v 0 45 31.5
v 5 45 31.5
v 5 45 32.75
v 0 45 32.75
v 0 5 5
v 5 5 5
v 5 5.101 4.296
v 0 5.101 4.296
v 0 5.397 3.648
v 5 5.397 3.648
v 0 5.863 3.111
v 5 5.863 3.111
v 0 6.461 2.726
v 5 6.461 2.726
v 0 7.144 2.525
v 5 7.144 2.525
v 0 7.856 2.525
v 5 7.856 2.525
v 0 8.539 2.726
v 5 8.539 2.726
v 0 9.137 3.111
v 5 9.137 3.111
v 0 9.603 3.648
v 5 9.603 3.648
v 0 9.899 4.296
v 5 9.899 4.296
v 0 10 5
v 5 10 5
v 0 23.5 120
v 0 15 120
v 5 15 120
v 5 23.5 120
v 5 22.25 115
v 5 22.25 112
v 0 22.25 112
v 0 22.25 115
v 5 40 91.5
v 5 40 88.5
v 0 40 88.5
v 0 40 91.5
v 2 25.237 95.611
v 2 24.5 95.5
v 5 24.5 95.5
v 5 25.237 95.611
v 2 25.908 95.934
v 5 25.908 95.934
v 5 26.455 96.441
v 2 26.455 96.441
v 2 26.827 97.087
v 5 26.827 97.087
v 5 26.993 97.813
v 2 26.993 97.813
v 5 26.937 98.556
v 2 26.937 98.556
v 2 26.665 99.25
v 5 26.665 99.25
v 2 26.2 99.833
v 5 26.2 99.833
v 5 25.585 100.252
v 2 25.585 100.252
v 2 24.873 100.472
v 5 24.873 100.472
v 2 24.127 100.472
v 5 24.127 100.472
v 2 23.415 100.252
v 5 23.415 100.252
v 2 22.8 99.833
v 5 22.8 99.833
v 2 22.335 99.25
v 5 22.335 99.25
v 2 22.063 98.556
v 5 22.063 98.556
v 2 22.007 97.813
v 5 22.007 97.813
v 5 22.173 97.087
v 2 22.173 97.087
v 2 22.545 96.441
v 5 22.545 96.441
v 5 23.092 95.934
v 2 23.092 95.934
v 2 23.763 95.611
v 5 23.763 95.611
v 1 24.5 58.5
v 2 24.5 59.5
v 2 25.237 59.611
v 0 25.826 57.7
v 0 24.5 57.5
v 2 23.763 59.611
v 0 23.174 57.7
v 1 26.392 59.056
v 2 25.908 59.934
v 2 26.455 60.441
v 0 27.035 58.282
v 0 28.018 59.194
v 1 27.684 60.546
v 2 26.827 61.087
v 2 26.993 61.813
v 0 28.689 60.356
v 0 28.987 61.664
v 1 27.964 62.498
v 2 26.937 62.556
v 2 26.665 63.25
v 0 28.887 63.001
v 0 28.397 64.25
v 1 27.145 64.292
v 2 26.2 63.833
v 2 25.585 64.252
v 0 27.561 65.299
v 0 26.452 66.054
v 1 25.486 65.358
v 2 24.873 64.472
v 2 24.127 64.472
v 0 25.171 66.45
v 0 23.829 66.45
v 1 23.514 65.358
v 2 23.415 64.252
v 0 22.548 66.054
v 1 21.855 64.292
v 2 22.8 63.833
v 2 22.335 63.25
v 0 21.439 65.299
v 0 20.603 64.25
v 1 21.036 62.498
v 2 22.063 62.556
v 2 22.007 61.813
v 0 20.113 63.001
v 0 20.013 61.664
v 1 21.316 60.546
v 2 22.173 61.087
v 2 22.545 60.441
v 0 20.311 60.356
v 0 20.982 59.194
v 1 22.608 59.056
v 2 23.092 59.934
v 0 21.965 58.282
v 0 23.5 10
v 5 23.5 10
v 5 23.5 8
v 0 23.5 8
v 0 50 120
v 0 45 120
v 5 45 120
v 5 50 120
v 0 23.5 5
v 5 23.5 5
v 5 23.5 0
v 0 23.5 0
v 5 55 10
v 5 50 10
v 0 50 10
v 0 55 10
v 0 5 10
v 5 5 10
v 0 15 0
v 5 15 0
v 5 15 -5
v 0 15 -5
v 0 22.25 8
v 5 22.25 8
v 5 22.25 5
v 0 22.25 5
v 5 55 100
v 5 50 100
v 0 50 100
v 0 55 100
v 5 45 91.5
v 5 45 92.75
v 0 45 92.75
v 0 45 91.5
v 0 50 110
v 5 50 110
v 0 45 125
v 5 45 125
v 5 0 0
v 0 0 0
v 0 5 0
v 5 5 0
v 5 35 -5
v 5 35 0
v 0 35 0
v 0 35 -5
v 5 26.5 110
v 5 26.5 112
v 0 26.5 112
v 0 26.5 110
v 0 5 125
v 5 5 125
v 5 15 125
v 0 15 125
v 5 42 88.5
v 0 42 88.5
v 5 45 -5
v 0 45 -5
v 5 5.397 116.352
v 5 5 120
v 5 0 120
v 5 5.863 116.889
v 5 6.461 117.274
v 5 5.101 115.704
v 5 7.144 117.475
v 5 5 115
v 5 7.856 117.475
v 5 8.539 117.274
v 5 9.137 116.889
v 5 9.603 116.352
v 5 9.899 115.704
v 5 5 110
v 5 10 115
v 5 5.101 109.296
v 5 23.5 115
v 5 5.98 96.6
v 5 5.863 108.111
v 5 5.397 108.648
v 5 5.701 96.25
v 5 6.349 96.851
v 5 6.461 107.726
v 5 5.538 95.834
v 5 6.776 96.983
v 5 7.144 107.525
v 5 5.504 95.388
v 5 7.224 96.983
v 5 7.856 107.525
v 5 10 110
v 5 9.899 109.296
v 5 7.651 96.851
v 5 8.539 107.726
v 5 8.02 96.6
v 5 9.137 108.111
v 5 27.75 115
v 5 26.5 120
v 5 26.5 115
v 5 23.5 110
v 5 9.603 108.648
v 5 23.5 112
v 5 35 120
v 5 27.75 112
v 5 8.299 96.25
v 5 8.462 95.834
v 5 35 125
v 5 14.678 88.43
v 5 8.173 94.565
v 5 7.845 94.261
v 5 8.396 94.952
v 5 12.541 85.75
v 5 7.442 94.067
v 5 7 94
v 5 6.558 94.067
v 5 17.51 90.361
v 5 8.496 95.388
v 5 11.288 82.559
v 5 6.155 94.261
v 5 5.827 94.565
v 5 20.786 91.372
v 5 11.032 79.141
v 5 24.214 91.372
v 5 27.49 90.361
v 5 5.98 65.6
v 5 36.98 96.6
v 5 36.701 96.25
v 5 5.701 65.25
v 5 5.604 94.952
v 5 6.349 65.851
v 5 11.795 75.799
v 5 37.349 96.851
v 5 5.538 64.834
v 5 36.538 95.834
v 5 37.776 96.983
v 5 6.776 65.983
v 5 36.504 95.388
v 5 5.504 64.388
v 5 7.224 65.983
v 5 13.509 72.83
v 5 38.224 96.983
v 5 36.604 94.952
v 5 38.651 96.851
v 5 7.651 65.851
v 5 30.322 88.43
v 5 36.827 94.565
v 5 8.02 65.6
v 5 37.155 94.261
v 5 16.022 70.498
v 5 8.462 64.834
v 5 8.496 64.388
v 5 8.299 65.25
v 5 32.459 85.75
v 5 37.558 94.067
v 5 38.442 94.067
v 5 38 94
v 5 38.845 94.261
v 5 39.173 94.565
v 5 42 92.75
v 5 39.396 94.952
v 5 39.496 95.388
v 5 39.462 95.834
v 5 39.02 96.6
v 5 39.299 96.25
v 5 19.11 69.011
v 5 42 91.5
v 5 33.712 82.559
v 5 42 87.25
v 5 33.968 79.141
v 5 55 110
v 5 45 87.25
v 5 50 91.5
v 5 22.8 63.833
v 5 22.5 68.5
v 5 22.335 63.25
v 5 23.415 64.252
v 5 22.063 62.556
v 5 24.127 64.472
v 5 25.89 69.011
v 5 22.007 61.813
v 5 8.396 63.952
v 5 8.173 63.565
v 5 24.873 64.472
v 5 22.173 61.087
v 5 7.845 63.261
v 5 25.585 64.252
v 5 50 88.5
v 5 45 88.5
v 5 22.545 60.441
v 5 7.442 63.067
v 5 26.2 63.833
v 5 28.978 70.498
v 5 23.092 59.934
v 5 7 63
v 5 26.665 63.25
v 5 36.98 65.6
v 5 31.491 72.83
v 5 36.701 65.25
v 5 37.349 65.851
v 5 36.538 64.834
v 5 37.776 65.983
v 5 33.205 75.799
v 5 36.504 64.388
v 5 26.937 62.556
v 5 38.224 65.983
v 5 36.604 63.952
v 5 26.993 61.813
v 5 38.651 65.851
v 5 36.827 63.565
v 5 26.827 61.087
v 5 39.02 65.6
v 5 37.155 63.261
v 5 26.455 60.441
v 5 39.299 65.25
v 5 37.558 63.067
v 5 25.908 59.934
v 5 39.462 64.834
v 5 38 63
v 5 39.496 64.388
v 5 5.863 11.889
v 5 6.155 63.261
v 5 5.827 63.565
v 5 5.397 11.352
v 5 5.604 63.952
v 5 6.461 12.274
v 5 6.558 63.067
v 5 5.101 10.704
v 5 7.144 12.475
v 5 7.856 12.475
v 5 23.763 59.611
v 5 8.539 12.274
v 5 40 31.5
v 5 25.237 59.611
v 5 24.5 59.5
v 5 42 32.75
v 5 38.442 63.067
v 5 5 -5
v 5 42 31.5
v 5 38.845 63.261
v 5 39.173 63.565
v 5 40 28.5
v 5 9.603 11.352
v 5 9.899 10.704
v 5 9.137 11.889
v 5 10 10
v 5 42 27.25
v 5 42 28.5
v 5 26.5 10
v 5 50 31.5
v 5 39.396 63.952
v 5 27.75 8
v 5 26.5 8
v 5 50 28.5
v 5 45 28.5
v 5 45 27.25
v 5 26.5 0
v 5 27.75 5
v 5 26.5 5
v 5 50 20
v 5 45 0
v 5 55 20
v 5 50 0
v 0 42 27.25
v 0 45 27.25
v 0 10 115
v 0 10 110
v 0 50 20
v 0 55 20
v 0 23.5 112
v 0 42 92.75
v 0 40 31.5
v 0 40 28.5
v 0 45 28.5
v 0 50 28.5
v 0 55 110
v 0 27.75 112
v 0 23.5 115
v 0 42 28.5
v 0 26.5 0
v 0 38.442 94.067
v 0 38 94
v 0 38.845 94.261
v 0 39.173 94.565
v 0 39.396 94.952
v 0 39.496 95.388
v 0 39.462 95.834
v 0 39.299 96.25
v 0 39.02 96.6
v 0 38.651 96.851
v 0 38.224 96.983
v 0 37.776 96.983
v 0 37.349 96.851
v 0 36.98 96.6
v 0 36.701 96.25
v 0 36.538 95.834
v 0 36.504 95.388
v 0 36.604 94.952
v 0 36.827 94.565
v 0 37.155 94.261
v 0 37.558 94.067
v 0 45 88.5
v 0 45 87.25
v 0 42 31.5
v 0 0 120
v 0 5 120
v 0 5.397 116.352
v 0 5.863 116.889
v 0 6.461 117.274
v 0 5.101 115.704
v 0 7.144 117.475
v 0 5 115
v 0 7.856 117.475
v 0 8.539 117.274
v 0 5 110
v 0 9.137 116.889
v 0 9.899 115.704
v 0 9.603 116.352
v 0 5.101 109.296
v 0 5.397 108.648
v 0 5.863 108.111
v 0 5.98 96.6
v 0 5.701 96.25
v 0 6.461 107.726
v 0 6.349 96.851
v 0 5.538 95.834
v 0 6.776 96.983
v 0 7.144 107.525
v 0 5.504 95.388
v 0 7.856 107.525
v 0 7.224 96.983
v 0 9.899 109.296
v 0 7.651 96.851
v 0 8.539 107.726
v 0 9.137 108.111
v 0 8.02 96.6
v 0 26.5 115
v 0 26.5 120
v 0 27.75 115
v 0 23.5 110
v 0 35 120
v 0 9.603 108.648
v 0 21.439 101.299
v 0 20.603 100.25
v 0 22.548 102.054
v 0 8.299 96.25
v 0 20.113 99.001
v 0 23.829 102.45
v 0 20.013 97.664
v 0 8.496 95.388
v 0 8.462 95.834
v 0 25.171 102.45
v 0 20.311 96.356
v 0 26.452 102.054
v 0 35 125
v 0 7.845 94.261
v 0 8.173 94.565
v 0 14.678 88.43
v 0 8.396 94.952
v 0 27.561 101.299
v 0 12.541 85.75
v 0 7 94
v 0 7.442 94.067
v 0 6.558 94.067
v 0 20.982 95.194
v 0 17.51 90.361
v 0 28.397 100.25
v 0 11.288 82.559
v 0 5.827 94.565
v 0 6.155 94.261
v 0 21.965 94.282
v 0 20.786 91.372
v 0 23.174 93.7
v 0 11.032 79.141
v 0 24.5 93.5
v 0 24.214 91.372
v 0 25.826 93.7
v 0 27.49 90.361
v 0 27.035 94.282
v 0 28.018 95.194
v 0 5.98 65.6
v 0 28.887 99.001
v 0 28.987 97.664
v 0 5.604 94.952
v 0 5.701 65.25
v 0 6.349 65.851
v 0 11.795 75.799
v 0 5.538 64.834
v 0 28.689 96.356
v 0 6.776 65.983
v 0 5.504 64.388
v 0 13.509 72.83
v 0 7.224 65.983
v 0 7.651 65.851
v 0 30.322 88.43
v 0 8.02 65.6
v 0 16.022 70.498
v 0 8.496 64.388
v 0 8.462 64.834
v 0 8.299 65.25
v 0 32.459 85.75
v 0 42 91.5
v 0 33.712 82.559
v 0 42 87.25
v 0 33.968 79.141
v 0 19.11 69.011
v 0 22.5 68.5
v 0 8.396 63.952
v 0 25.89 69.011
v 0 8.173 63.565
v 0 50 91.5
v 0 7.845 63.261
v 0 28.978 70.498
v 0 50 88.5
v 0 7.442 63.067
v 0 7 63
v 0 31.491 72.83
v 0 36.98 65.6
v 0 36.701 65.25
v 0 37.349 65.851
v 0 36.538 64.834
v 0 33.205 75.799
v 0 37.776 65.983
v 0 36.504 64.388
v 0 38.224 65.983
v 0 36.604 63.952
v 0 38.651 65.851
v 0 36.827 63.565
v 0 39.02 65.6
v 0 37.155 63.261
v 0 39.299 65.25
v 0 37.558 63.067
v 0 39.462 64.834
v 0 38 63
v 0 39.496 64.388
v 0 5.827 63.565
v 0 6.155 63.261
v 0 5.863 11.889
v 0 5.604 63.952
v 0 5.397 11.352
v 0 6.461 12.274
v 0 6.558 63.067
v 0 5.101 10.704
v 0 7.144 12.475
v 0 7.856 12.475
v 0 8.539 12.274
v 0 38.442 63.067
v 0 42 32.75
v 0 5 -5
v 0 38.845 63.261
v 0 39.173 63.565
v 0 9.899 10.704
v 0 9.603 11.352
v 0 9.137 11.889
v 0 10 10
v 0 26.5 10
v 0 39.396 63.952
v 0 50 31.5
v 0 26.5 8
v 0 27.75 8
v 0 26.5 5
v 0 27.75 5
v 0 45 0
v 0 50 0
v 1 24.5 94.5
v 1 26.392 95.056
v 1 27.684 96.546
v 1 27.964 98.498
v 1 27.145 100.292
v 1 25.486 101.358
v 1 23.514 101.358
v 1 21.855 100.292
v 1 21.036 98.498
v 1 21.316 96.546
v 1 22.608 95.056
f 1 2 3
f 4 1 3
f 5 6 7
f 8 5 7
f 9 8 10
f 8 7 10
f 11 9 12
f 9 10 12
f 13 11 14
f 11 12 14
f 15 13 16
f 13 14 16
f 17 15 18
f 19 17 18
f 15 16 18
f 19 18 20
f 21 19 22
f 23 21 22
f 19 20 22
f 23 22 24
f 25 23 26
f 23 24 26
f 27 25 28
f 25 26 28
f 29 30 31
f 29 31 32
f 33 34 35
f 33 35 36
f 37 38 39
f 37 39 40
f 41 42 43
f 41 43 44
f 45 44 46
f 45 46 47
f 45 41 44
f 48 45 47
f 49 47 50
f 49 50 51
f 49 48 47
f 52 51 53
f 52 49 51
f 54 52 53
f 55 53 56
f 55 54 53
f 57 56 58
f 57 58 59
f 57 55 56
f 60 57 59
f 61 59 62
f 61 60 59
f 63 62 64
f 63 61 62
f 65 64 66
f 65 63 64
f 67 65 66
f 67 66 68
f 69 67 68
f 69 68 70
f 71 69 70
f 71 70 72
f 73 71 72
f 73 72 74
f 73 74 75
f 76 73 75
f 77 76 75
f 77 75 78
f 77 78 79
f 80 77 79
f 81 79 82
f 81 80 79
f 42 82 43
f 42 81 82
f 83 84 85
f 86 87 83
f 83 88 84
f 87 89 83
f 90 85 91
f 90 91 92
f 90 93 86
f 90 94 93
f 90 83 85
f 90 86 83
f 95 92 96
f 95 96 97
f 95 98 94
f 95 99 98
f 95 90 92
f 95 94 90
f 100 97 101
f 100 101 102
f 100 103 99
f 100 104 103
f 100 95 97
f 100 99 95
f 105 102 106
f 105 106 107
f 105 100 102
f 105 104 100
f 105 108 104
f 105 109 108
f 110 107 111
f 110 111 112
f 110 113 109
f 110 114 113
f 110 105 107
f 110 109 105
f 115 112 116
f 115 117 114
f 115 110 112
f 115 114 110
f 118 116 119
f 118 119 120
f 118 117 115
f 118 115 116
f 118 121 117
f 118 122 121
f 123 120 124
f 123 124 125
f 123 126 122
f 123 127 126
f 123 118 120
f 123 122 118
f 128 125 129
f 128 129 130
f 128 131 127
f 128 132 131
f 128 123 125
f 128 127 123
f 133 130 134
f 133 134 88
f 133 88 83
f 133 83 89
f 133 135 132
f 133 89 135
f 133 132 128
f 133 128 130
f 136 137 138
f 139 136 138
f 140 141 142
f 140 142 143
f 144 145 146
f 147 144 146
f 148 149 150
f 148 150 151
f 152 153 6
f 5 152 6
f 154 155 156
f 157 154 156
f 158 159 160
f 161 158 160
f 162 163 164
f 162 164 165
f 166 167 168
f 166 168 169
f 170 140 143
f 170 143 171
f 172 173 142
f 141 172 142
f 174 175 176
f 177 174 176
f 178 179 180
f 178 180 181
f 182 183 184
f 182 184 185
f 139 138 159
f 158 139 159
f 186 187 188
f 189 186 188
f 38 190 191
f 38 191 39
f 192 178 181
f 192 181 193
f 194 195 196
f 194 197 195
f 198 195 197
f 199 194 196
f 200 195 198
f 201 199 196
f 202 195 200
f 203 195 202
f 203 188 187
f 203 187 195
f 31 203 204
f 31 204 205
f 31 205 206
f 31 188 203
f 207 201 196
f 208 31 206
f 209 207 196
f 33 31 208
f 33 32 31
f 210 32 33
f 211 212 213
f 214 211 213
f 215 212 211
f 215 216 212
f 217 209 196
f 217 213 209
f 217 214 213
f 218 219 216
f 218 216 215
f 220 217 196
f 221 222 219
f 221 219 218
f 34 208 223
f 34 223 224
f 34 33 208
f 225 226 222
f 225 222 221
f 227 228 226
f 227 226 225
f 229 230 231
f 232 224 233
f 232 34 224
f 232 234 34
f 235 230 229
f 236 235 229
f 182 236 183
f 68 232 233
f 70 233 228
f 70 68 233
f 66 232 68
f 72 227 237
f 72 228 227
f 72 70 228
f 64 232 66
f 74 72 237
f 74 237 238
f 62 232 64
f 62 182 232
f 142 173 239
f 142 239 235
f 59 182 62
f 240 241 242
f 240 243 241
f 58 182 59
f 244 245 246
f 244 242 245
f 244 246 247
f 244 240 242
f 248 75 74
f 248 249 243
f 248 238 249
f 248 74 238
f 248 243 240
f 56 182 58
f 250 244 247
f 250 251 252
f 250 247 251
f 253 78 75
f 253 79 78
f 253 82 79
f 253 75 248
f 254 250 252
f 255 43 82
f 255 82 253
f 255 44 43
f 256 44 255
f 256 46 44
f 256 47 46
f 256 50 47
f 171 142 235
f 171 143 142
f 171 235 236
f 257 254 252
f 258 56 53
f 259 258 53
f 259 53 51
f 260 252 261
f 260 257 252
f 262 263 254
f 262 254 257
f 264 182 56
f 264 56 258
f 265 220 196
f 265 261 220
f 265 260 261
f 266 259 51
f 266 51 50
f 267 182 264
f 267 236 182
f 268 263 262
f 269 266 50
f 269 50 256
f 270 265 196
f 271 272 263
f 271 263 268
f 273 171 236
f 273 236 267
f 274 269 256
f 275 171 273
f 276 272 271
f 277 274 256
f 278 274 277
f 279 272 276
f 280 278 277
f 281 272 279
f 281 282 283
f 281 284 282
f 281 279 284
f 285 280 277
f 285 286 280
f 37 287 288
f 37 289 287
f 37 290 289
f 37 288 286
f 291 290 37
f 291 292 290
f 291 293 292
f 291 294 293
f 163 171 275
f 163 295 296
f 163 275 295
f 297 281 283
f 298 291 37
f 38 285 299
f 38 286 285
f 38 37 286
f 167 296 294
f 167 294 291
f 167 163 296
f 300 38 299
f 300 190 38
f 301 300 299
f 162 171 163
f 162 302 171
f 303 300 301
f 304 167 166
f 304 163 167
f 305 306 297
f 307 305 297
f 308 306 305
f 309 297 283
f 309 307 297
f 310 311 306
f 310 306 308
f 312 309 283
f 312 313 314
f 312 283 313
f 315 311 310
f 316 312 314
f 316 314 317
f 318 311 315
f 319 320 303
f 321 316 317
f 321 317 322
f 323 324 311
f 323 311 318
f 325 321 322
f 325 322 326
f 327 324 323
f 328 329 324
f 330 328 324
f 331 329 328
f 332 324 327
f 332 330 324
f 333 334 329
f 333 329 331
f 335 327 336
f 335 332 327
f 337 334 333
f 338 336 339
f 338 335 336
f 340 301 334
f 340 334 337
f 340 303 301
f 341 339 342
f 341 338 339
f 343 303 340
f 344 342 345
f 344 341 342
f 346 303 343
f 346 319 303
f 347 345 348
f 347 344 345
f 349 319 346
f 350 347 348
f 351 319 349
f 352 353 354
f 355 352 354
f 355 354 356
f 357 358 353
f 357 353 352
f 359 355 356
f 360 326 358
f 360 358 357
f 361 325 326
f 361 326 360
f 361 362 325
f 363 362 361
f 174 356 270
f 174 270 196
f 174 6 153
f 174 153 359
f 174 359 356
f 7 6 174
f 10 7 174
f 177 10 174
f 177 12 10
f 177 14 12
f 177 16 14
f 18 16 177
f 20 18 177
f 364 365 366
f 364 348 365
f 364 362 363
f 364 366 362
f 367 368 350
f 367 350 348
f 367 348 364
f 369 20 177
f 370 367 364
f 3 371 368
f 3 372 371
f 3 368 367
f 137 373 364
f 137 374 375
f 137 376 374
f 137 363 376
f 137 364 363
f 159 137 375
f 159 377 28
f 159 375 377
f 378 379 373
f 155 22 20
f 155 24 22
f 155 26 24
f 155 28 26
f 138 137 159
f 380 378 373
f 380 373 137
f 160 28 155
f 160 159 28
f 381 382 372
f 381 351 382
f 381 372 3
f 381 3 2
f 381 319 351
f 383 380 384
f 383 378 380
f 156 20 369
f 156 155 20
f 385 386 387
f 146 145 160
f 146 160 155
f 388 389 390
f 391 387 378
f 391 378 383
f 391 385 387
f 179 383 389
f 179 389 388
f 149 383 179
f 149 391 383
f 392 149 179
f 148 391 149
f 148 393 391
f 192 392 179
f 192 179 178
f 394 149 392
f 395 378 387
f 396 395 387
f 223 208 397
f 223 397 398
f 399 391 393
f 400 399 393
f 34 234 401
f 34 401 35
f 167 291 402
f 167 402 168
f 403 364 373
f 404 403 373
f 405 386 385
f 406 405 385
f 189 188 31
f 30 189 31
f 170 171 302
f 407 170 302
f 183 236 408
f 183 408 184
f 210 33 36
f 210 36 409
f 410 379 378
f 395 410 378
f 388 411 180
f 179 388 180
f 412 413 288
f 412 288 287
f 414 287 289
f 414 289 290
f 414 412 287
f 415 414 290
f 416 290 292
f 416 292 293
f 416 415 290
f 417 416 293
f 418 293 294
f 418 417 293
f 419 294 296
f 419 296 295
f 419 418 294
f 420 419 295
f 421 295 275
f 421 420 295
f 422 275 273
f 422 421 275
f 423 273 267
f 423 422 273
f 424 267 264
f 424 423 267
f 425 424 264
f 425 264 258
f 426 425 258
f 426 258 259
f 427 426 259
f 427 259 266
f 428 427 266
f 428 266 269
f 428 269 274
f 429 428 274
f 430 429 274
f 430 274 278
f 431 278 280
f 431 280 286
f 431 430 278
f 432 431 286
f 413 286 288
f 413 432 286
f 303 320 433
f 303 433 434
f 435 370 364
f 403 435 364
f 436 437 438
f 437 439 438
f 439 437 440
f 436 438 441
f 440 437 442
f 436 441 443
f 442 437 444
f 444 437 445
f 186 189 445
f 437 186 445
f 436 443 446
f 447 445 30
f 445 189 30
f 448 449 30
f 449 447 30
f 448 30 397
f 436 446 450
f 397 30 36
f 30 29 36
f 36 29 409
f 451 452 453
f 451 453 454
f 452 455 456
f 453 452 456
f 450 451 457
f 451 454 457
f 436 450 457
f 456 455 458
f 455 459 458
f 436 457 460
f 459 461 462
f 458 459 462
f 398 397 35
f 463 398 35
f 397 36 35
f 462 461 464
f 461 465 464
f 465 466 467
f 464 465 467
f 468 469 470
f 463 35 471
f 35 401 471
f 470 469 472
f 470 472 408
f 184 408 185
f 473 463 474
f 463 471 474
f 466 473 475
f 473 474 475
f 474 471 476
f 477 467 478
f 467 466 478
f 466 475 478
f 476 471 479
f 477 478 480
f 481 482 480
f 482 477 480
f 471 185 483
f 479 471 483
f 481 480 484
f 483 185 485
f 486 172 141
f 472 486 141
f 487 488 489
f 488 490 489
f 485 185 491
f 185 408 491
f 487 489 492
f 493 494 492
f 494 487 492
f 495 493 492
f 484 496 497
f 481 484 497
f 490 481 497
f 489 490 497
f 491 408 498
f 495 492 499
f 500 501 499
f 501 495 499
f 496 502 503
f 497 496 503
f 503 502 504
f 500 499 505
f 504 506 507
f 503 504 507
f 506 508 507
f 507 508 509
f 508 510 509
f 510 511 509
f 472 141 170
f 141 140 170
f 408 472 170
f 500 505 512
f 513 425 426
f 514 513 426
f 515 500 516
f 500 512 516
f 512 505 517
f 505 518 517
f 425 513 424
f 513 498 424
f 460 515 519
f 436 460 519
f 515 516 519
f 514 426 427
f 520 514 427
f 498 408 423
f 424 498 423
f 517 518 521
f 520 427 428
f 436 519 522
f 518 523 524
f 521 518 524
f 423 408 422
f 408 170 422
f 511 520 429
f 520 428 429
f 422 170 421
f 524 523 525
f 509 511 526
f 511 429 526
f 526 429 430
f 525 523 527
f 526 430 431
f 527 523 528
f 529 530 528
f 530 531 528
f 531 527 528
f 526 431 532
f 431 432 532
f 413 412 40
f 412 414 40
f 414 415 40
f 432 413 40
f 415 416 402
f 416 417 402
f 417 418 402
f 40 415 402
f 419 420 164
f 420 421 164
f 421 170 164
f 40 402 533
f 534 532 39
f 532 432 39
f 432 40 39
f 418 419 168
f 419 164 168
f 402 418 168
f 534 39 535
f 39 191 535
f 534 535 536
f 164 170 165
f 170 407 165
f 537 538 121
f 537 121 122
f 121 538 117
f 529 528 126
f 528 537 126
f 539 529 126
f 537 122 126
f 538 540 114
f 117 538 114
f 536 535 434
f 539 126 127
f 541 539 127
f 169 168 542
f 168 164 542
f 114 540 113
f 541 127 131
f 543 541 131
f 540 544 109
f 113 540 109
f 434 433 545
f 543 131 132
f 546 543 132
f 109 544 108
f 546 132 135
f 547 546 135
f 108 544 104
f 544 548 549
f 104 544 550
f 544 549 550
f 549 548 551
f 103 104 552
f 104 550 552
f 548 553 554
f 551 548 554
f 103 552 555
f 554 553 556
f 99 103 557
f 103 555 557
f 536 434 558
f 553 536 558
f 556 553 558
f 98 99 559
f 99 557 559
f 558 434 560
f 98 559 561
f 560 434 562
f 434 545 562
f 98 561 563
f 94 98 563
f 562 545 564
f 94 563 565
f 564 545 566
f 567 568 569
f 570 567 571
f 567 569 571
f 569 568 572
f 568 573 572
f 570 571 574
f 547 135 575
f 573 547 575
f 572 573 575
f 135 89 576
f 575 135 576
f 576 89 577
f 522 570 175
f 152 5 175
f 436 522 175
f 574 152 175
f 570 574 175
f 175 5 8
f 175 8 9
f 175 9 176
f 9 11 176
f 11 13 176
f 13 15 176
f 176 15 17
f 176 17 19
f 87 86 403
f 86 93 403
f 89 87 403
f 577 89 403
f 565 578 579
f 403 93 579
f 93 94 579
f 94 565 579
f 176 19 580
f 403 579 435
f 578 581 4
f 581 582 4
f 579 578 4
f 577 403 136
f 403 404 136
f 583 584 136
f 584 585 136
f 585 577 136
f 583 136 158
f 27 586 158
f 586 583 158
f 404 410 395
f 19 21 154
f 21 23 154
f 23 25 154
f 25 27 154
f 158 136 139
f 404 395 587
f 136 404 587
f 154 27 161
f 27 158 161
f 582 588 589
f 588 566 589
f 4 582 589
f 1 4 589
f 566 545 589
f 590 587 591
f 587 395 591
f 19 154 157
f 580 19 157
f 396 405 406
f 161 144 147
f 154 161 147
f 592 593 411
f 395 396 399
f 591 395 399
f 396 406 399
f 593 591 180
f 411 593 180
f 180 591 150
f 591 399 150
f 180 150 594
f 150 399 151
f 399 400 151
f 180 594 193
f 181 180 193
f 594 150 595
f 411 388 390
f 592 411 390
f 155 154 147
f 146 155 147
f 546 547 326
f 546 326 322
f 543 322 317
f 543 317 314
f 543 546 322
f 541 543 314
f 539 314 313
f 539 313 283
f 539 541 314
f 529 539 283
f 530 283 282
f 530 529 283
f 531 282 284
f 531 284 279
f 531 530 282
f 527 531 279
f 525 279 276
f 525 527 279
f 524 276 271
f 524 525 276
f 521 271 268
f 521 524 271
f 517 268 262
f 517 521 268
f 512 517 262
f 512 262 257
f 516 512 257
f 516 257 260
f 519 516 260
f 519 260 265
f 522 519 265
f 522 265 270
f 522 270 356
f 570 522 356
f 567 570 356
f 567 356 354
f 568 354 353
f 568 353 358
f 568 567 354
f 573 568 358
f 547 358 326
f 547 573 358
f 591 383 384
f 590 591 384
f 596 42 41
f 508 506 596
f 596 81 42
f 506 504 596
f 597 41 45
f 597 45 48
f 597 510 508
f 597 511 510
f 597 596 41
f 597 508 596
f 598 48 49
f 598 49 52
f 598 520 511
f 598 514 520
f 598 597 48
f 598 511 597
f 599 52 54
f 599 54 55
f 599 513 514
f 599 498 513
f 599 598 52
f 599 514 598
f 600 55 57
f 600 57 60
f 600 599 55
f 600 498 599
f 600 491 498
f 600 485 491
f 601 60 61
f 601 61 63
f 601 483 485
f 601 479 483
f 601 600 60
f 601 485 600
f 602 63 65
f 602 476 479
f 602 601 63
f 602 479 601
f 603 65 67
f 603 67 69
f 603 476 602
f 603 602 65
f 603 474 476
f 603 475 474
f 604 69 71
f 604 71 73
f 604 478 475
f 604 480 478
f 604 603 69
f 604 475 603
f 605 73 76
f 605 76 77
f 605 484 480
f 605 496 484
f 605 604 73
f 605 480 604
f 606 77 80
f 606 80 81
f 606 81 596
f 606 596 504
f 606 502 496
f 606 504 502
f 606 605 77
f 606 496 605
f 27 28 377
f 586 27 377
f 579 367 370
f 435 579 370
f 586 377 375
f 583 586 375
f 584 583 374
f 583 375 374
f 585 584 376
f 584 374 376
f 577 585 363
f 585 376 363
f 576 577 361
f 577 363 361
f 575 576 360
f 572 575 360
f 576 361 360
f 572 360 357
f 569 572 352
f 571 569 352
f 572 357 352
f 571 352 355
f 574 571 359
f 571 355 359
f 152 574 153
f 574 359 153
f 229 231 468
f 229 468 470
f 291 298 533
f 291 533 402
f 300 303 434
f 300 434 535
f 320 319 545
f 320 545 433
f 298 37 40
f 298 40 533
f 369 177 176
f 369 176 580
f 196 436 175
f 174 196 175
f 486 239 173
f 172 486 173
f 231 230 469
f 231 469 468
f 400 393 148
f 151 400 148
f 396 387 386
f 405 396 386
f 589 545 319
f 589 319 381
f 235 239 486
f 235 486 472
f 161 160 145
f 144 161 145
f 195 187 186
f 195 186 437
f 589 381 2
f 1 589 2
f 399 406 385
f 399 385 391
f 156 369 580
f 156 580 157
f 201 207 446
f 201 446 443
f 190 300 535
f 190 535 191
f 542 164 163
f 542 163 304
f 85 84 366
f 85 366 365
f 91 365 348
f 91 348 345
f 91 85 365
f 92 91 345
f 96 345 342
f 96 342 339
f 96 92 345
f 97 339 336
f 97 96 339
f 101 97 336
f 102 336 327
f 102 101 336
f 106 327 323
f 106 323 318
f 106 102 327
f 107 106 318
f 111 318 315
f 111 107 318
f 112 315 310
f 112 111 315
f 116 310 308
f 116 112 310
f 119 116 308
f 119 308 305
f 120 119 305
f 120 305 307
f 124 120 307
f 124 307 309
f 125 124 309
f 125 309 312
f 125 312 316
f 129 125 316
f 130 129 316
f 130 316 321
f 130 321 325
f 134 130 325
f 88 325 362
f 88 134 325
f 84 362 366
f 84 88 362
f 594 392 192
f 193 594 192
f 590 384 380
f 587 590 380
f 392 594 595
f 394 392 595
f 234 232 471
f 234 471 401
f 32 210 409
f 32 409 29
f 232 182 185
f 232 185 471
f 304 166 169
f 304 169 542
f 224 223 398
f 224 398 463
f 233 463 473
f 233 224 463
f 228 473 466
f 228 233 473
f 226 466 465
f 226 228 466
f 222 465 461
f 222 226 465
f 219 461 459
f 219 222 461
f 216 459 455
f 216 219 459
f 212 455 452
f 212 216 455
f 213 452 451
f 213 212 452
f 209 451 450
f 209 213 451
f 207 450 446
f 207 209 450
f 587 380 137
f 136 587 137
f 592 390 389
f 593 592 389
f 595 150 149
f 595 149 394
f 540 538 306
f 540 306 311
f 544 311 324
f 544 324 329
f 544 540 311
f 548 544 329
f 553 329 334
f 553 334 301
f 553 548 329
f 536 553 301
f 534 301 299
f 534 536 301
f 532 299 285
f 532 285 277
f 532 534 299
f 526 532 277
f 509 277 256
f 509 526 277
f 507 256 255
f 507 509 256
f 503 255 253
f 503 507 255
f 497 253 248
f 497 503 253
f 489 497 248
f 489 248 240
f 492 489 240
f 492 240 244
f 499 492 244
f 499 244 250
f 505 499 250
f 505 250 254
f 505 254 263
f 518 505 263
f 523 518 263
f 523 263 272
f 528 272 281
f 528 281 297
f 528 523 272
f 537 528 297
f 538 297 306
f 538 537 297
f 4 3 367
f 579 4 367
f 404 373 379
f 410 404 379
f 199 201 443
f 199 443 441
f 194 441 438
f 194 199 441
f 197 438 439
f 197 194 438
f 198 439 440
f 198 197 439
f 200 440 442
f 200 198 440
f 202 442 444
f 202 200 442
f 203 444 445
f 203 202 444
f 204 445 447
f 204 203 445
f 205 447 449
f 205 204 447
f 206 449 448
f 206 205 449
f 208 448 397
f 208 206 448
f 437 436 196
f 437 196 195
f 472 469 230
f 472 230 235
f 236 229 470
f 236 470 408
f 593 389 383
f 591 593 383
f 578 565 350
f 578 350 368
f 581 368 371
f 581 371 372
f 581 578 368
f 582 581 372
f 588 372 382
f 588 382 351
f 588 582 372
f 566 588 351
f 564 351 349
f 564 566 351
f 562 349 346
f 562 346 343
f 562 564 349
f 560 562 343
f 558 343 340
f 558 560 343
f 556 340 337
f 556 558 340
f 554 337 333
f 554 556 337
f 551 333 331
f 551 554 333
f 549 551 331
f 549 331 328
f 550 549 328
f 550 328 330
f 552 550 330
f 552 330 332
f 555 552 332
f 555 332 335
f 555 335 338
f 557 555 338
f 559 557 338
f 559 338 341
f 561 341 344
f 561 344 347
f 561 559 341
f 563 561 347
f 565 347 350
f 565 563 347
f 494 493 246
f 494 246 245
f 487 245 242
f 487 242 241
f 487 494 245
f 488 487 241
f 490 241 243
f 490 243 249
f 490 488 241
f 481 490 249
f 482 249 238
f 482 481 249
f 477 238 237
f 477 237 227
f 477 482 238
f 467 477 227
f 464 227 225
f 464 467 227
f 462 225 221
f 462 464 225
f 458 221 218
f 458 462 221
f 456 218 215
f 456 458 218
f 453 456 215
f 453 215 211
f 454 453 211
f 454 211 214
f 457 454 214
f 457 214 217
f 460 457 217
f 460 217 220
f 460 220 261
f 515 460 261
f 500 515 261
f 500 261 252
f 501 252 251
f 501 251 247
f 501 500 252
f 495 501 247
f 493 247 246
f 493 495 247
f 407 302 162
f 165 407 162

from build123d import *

# Parameters (mm, degrees)
SKETCH1_W           = 120
SKETCH1_H           = 50
SKETCH1_R           = 1.5
SKETCH1_R_2         = 11.5
SKETCH1_R_3         = 2.5
BOSS_EXTRUDE1_DEPTH = 5
CHAMFER1_SIZE       = 2
SKETCH2_W           = 5
SKETCH2_H           = 10
SKETCH2_W_2         = 10
SKETCH2_H_2         = 5
BOSS_EXTRUDE2_DEPTH = 5
CUT_EXTRUDE1_DEPTH  = 137.656503687


with BuildPart() as part:
    # Sketch1 → Boss-Extrude1 (new body)
    with BuildSketch(Plane(origin=(0, 0, 0), x_dir=(0, 0, -1), z_dir=(1, 0, 0))):
        with Locations((-60, 25)):
            Rectangle(SKETCH1_W, SKETCH1_H)
        with Locations((-95.5, 38)):
            Circle(SKETCH1_R, mode=Mode.SUBTRACT)
        with Locations((-64.5, 38)):
            Circle(SKETCH1_R, mode=Mode.SUBTRACT)
        with Locations((-64.5, 7)):
            Circle(SKETCH1_R, mode=Mode.SUBTRACT)
        with Locations((-95.5, 7)):
            Circle(SKETCH1_R, mode=Mode.SUBTRACT)
        with Locations((-80, 22.5)):
            Circle(SKETCH1_R_2, mode=Mode.SUBTRACT)
        with Locations((-98, 24.5)):
            Circle(SKETCH1_R_3, mode=Mode.SUBTRACT)
        with Locations((-62, 24.5)):
            Circle(SKETCH1_R_3, mode=Mode.SUBTRACT)
    extrude(amount=BOSS_EXTRUDE1_DEPTH)

    # Chamfer1
    chamfer1_edges = [part.edges().sort_by_distance(p)[0] for p in [
        (0, 24.5, 100.5),
        (0, 24.5, 64.5),
    ]]
    chamfer(chamfer1_edges, length=CHAMFER1_SIZE)

    # Sketch2 → Boss-Extrude2 (add)
    with BuildSketch(Plane(origin=(5, 0, 0), x_dir=(0, 0, -1), z_dir=(1, 0, 0))):
        with Locations((-122.5, 10)):
            Rectangle(SKETCH2_W, SKETCH2_H)
        with Locations((-122.5, 40)):
            Rectangle(SKETCH2_W, SKETCH2_H)
        with Locations((-105, 52.5)):
            Rectangle(SKETCH2_W_2, SKETCH2_H_2)
        with Locations((-15, 52.5)):
            Rectangle(SKETCH2_W_2, SKETCH2_H_2)
        with Locations((2.5, 40)):
            Rectangle(SKETCH2_W, SKETCH2_H)
        with Locations((2.5, 10)):
            Rectangle(SKETCH2_W, SKETCH2_H)
    extrude(amount=-BOSS_EXTRUDE2_DEPTH)

    # Sketch3 → Cut-Extrude1 (cut, through all)
    with BuildSketch(Plane(origin=(5, 0, 0), x_dir=(0, 0, -1), z_dir=(1, 0, 0))):
        Polygon((0, 26.5), (-5, 26.5), (-5, 27.75), (-8, 27.75), (-8, 26.5), (-10, 26.5), (-10, 23.5), (-8, 23.5), (-8, 22.25), (-5, 22.25), (-5, 23.5), (0, 23.5), align=None)
        Polygon((-120, 23.5), (-120, 26.5), (-115, 26.5), (-115, 27.75), (-112, 27.75), (-112, 26.5), (-110, 26.5), (-110, 23.5), (-112, 23.5), (-112, 22.25), (-115, 22.25), (-115, 23.5), align=None)
        Polygon((-31.5, 50), (-31.5, 45), (-32.75, 45), (-32.75, 42), (-31.5, 42), (-31.5, 40), (-28.5, 40), (-28.5, 42), (-27.25, 42), (-27.25, 45), (-28.5, 45), (-28.5, 50), align=None)
        Polygon((-91.5, 50), (-88.5, 50), (-88.5, 45), (-87.25, 45), (-87.25, 42), (-88.5, 42), (-88.5, 40), (-91.5, 40), (-91.5, 42), (-92.75, 42), (-92.75, 45), (-91.5, 45), align=None)
        with BuildLine():
            Line((-115, 10), (-110, 10))
            ThreePointArc((-110, 10), (-107.5, 7.5), (-110, 5))
            Line((-110, 5), (-115, 5))
            ThreePointArc((-115, 5), (-117.5, 7.5), (-115, 10))
        make_face()
        with BuildLine():
            Line((-5, 10), (-10, 10))
            ThreePointArc((-10, 10), (-12.5, 7.5), (-10, 5))
            Line((-10, 5), (-5, 5))
            ThreePointArc((-5, 5), (-2.5, 7.5), (-5, 10))
        make_face()
    extrude(amount=-CUT_EXTRUDE1_DEPTH, mode=Mode.SUBTRACT)


solid = part.part
